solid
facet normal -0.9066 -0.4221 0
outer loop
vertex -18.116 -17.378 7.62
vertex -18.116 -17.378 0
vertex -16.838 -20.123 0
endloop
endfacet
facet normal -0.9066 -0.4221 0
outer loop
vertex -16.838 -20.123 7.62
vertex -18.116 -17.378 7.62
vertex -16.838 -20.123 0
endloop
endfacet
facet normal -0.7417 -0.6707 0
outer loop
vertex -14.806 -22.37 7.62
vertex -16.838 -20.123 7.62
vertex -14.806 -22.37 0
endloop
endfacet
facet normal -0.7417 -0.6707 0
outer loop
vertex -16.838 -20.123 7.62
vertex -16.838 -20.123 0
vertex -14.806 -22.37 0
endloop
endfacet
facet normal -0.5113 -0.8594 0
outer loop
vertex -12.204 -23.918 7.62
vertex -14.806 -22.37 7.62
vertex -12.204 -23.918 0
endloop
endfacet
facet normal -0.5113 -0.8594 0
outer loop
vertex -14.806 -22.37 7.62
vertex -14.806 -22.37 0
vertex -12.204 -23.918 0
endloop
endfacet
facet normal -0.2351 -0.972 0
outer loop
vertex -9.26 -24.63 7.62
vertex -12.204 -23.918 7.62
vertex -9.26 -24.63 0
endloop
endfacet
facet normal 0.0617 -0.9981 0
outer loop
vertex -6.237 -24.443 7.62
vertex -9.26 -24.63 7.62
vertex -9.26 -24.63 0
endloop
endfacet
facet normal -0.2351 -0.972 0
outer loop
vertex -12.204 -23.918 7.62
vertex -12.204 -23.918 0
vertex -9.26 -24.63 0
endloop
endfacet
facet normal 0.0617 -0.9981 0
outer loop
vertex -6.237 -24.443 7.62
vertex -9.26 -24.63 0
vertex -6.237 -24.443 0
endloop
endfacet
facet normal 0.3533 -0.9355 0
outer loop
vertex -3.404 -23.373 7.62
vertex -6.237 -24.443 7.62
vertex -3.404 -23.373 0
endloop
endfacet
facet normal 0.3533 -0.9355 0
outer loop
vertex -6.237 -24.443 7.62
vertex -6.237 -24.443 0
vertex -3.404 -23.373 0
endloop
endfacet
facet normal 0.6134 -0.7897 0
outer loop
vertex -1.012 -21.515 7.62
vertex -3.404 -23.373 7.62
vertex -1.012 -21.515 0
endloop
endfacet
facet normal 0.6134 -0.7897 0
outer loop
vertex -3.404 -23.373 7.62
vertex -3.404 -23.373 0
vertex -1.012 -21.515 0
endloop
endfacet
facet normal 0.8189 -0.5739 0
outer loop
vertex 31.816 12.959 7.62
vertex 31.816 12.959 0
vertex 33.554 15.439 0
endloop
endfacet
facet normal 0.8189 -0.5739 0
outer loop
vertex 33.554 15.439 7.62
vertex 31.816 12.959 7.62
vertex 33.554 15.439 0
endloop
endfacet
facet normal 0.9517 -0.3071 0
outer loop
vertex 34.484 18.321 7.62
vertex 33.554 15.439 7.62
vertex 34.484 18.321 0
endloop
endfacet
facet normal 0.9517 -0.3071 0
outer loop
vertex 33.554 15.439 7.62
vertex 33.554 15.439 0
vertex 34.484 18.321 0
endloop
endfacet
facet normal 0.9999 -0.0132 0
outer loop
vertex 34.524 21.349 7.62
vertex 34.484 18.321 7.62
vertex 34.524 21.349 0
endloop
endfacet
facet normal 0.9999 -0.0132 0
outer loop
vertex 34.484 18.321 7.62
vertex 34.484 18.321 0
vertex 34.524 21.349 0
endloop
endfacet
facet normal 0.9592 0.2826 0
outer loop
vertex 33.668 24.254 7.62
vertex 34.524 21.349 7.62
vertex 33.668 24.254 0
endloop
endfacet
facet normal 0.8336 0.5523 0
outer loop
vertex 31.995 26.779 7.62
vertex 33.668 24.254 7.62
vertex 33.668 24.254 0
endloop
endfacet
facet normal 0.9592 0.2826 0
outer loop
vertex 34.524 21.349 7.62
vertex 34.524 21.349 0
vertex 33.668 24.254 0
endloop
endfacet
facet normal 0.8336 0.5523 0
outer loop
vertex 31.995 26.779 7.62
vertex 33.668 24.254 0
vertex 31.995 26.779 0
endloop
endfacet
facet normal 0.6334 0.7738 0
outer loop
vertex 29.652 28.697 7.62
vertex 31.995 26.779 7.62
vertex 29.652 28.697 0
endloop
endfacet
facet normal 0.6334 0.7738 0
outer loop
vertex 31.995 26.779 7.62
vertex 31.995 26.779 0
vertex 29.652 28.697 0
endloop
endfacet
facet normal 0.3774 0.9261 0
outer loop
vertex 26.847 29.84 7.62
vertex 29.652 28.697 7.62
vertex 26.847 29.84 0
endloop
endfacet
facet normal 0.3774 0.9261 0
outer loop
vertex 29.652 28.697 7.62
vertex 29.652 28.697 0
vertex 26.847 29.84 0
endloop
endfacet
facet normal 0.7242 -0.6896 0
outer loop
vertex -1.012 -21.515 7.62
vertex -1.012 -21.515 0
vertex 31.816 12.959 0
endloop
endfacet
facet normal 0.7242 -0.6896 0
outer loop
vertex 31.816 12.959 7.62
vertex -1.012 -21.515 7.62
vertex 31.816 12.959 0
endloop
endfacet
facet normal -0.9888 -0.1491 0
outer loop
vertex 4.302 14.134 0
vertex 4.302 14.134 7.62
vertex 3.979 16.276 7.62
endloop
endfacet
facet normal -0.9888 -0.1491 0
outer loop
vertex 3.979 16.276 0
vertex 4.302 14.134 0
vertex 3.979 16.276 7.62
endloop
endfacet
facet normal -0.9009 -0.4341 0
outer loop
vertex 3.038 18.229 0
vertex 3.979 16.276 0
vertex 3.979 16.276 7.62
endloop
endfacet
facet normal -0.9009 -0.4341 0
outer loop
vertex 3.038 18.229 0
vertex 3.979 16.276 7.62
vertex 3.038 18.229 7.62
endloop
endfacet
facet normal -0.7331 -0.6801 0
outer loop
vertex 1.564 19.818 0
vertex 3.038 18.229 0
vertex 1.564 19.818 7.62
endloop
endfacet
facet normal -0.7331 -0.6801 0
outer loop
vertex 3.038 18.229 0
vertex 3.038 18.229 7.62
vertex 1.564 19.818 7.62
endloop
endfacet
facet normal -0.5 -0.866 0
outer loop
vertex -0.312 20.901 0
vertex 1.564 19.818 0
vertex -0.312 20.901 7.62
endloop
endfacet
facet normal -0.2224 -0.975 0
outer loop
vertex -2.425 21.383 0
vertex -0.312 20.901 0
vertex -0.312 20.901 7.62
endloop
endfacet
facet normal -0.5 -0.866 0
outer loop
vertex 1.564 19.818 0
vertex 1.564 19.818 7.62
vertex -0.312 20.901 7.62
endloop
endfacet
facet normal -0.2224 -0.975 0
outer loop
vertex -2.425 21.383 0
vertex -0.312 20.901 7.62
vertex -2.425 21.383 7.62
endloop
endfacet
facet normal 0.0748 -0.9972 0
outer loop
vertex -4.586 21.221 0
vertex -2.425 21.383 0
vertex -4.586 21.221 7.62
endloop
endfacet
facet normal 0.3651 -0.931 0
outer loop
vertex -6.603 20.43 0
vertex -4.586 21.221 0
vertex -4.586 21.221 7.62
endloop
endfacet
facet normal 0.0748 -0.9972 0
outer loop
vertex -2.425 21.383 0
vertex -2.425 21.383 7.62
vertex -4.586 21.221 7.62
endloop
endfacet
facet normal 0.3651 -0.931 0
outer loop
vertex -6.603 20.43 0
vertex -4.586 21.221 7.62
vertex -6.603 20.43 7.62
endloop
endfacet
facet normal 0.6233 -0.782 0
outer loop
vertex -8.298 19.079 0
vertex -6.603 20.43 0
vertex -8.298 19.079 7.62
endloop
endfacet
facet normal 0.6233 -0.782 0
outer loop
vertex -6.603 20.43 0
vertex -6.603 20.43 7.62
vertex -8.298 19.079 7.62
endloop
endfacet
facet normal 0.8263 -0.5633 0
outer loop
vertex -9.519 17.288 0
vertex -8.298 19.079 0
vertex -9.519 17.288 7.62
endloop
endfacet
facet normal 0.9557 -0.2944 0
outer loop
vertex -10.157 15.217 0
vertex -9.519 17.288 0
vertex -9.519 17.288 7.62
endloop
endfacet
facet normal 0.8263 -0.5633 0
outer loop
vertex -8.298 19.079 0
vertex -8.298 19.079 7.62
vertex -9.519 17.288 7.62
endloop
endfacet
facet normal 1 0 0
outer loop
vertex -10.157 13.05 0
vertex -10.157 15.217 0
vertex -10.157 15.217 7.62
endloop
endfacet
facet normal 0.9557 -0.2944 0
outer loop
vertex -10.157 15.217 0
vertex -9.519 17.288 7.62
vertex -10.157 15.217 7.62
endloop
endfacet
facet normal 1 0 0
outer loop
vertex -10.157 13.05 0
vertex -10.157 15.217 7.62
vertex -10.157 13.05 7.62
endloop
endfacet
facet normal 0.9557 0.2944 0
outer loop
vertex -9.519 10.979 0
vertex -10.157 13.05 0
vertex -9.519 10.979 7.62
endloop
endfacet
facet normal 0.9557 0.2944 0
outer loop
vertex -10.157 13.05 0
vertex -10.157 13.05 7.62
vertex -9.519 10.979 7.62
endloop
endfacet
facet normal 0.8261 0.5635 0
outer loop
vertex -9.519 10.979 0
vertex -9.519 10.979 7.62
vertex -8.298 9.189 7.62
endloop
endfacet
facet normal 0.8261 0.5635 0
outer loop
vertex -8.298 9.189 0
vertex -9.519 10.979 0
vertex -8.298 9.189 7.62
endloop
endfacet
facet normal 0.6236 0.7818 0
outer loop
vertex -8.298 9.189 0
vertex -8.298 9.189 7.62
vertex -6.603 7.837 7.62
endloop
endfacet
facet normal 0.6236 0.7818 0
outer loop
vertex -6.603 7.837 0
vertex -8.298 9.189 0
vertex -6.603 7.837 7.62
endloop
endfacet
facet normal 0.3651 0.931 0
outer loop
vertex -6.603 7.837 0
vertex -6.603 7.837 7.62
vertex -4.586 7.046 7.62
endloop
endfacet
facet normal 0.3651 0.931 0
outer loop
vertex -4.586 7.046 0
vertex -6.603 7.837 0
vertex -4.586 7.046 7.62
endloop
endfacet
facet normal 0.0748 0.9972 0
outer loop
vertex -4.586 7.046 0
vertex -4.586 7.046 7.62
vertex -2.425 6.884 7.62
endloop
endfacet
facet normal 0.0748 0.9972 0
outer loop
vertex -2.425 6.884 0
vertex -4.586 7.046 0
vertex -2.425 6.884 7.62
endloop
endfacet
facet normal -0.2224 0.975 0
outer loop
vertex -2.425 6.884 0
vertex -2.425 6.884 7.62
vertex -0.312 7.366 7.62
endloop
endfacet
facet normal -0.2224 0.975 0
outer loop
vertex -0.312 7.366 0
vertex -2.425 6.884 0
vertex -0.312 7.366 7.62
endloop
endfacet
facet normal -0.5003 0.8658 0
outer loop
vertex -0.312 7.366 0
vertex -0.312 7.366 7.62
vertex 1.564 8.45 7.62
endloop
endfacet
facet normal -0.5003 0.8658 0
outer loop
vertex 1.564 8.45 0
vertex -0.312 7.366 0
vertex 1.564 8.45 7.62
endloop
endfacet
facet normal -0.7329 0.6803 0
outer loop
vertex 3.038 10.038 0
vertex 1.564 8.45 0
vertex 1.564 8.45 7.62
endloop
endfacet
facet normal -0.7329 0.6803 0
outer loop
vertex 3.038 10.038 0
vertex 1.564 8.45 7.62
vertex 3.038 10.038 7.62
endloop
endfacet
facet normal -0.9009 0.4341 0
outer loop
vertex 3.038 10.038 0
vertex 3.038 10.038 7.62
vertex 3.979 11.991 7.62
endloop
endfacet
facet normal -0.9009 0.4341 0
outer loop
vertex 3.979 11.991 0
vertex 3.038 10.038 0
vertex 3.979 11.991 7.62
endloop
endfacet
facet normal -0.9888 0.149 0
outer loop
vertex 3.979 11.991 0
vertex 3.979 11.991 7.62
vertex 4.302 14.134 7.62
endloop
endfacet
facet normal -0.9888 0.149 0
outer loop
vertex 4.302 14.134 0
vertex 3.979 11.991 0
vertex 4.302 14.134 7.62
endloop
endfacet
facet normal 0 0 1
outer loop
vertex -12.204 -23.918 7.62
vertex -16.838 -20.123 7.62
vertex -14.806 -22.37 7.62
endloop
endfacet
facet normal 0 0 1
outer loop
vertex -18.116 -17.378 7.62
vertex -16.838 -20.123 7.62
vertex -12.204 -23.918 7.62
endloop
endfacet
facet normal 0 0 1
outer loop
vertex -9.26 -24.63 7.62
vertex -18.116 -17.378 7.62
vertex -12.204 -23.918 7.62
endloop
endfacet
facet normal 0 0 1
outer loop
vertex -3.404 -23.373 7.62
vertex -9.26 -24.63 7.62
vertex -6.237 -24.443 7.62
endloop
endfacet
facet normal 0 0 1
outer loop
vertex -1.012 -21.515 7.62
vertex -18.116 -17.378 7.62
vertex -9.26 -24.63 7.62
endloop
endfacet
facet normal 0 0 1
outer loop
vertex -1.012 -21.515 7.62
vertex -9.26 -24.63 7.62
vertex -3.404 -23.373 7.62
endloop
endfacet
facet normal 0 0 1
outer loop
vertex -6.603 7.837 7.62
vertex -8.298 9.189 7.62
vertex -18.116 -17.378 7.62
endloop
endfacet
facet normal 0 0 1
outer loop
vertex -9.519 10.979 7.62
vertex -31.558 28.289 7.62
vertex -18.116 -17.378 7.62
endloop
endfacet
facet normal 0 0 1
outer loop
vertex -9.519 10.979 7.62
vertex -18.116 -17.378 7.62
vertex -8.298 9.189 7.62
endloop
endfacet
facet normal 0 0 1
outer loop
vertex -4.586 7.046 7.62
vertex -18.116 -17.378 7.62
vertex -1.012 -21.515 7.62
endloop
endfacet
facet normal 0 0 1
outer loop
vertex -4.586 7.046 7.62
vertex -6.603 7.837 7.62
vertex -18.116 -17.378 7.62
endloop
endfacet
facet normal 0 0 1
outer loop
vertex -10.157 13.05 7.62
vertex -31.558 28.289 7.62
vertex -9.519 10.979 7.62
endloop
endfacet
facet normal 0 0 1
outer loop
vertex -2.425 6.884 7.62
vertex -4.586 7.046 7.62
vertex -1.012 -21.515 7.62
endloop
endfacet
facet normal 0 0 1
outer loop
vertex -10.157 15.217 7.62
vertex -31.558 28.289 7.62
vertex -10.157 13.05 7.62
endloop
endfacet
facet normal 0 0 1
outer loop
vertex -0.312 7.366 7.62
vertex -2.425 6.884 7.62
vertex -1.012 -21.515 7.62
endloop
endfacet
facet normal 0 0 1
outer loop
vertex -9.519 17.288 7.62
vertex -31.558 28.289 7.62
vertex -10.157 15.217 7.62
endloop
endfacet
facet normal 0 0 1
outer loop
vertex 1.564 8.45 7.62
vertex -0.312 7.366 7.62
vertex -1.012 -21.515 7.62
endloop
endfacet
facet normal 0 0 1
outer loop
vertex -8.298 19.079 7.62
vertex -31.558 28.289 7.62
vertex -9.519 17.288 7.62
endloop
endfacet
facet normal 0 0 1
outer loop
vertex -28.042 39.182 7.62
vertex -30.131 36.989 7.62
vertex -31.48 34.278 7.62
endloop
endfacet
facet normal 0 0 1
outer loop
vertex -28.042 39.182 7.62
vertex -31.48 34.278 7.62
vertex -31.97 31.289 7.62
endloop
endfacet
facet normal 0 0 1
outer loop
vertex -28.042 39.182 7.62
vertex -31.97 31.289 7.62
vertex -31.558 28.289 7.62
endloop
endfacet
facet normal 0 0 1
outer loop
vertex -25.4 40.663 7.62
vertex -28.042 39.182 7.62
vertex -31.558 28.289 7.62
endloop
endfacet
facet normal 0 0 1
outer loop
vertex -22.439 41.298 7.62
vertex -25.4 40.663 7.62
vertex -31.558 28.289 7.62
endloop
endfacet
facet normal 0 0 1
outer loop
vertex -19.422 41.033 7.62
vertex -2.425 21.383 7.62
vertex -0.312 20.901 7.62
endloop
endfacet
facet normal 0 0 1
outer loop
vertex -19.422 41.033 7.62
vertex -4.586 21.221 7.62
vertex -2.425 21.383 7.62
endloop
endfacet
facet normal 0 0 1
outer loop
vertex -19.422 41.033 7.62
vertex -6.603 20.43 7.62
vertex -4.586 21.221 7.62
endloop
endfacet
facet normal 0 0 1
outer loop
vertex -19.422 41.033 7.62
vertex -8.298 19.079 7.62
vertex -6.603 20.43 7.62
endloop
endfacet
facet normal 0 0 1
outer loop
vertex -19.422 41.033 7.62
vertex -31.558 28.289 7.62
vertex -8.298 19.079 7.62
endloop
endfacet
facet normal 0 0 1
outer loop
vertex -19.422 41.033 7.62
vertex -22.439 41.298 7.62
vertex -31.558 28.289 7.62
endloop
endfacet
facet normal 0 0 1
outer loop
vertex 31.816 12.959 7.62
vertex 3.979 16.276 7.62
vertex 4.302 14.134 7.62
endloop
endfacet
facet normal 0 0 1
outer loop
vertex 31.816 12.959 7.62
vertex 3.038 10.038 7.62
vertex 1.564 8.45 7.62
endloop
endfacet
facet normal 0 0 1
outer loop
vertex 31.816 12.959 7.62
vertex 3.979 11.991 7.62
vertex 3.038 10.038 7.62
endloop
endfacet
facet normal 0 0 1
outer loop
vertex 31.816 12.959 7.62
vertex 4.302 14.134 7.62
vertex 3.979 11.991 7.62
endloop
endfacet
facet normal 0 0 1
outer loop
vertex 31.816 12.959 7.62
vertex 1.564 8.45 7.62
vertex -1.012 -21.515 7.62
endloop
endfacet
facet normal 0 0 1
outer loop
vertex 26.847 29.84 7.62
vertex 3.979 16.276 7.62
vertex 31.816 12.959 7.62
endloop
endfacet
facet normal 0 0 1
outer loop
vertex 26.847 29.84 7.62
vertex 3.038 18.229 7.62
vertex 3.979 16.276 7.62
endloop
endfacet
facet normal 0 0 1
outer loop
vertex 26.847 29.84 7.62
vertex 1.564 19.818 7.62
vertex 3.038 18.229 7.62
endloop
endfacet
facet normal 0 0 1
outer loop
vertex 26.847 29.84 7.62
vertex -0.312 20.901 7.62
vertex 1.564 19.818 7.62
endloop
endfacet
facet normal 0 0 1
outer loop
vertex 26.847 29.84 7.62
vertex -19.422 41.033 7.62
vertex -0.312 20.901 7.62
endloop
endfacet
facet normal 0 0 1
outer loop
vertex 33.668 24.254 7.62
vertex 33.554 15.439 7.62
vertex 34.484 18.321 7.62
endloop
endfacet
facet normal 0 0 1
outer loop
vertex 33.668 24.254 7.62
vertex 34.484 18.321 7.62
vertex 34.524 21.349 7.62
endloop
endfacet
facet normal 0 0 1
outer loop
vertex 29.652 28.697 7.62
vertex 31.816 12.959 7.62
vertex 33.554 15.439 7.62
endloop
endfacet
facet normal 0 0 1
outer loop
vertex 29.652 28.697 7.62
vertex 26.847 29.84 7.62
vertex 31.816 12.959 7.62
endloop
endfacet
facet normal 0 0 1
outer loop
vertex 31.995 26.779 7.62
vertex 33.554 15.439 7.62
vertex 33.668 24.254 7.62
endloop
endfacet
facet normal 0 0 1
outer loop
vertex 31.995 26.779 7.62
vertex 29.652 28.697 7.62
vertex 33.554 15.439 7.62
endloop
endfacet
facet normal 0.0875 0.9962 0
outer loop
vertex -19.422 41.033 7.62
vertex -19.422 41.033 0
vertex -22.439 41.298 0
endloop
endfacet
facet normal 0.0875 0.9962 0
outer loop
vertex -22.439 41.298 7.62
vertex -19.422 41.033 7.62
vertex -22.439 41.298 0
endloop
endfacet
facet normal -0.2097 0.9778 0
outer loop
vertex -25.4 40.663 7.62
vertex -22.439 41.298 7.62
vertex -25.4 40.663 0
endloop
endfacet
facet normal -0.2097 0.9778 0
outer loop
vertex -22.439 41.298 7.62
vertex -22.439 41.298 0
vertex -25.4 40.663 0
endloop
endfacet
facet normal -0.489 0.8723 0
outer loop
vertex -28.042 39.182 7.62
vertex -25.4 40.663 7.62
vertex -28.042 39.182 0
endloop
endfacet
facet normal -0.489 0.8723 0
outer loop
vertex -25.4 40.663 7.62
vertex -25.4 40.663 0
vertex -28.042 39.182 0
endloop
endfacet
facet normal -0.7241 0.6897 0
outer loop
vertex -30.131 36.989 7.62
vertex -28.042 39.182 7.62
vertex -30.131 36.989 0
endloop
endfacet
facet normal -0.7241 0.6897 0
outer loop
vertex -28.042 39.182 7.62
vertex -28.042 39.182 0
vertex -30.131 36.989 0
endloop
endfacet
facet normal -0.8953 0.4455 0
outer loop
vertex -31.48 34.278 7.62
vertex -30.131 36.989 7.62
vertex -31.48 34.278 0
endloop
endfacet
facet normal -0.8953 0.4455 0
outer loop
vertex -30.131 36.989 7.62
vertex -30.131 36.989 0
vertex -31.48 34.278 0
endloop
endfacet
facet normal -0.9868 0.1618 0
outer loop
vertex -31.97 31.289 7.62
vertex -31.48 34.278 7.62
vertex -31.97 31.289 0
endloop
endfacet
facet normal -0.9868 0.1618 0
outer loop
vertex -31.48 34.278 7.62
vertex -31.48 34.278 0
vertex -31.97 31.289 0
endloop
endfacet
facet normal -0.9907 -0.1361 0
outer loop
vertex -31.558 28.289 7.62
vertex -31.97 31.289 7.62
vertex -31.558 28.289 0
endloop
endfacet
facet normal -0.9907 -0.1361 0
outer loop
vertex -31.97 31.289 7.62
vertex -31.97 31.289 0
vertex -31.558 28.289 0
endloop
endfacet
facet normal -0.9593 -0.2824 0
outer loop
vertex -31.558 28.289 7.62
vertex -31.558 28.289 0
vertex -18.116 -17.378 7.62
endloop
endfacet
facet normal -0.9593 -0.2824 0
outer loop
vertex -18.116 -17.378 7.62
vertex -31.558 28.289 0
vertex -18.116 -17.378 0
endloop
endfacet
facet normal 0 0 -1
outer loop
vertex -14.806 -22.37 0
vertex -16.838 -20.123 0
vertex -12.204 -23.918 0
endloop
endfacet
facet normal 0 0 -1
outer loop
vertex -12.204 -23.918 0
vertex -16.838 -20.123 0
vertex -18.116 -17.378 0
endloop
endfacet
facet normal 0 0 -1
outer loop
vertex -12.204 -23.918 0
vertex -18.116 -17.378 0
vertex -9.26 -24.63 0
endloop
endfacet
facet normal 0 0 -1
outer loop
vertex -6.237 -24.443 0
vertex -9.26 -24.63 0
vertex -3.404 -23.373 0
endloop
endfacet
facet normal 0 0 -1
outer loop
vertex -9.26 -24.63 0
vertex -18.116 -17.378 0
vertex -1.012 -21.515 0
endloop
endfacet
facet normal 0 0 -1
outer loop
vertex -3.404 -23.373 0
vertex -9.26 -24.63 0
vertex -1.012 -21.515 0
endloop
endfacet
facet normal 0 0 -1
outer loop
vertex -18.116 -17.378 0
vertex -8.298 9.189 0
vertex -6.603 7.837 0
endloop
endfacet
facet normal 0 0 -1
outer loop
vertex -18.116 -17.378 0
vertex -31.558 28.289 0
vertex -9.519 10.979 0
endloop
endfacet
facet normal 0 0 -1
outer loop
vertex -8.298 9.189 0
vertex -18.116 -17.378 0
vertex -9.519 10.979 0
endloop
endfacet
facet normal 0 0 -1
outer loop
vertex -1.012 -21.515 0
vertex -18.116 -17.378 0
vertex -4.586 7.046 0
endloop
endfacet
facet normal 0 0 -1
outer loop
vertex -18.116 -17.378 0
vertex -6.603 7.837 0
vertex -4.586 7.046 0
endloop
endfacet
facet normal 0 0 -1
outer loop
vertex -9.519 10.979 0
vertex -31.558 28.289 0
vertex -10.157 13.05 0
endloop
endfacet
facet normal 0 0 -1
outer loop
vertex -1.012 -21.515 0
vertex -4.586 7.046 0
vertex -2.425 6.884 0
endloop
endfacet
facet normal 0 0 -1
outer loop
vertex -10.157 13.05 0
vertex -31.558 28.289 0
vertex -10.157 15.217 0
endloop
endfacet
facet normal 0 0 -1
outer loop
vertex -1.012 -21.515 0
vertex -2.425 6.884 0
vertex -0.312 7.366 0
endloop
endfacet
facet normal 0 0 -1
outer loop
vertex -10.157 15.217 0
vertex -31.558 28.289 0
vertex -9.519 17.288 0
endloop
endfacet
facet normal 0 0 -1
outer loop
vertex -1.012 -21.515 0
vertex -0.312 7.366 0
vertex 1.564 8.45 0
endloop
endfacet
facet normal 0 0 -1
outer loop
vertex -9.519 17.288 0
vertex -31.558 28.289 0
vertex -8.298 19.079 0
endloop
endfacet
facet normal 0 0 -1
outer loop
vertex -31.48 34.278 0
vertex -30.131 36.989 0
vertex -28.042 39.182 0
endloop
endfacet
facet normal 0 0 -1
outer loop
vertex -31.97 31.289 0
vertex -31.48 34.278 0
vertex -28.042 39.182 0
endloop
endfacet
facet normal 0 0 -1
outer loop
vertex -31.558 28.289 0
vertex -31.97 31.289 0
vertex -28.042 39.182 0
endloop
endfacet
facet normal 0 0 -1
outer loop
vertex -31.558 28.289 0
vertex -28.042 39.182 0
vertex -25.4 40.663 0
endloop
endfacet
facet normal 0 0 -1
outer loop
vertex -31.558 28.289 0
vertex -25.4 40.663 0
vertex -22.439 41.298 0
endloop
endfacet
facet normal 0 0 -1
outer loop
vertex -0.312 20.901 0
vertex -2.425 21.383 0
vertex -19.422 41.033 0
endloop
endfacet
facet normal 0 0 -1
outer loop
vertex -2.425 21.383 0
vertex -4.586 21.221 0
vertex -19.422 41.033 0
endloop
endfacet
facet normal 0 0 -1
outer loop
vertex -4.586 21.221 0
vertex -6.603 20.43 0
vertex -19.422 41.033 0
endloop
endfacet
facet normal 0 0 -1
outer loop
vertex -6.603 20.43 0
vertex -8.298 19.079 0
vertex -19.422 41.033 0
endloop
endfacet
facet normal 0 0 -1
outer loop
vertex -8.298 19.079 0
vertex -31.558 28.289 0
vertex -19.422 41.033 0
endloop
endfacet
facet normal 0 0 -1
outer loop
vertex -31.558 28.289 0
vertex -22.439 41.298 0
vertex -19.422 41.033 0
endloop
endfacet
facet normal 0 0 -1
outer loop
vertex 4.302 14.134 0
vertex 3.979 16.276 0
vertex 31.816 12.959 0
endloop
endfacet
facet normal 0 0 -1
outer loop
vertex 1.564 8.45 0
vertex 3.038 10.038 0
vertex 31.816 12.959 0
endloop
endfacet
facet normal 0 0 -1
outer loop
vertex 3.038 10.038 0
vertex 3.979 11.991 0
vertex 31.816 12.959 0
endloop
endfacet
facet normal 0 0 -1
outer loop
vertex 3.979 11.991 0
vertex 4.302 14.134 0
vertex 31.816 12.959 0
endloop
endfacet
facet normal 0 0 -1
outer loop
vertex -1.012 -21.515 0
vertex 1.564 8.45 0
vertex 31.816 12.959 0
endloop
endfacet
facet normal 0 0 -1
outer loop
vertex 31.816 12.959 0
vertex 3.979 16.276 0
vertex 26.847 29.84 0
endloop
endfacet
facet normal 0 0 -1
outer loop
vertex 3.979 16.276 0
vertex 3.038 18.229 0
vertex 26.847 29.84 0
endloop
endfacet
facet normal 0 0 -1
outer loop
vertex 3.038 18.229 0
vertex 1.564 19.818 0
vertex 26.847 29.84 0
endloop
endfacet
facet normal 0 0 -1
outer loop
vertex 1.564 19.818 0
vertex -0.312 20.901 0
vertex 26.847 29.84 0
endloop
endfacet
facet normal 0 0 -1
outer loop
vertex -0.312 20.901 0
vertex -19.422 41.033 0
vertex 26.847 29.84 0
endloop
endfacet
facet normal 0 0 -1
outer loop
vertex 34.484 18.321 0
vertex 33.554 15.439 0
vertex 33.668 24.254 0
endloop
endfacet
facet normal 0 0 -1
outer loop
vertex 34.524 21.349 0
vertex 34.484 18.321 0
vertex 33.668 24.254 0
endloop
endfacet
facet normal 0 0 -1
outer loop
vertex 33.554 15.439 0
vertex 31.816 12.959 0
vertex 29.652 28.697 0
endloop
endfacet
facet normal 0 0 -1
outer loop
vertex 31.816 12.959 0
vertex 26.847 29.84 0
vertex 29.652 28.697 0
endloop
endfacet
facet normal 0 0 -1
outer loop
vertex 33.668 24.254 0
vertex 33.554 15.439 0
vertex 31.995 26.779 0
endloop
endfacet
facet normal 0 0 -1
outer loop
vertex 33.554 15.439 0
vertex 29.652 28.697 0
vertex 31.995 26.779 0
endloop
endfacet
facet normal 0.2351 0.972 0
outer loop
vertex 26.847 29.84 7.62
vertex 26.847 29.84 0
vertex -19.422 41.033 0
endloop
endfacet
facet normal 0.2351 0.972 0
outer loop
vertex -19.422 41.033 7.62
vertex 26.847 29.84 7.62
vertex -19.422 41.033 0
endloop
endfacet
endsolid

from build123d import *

# Parameters (mm, degrees)
F1_DEPTH = 7.62
F2_R     = 7.270124
F3_DEPTH = 25.4


with BuildPart() as f1:
    # F0 (on Top) → F1 (new body)
    with BuildSketch(Plane.XY):
        with BuildLine():
            ThreePointArc((-19.422231, 41.032927), (-29.168799, 38.16413), (-31.557632, 28.288955))
            Line((-31.557632, 28.288955), (-18.116118, -17.377788))
            ThreePointArc((-18.116118, -17.377788), (-10.758383, -24.384165), (-1.011814, -21.515368))
            Line((-1.011814, -21.515368), (31.815989, 12.958696))
            ThreePointArc((31.815989, 12.958696), (34.204821, 22.833871), (26.847086, 29.840248))
            Line((26.847086, 29.840248), (-19.422231, 41.032927))
        make_face()
    extrude(amount=F1_DEPTH)

    # F2 (on face) → F3 (cut)
    with BuildSketch(Plane.XY.offset(7.62)):
        with Locations((-2.968387, 14.133593)):
            Circle(F2_R)
    extrude(amount=-F3_DEPTH, mode=Mode.SUBTRACT)


solid = f1.part
